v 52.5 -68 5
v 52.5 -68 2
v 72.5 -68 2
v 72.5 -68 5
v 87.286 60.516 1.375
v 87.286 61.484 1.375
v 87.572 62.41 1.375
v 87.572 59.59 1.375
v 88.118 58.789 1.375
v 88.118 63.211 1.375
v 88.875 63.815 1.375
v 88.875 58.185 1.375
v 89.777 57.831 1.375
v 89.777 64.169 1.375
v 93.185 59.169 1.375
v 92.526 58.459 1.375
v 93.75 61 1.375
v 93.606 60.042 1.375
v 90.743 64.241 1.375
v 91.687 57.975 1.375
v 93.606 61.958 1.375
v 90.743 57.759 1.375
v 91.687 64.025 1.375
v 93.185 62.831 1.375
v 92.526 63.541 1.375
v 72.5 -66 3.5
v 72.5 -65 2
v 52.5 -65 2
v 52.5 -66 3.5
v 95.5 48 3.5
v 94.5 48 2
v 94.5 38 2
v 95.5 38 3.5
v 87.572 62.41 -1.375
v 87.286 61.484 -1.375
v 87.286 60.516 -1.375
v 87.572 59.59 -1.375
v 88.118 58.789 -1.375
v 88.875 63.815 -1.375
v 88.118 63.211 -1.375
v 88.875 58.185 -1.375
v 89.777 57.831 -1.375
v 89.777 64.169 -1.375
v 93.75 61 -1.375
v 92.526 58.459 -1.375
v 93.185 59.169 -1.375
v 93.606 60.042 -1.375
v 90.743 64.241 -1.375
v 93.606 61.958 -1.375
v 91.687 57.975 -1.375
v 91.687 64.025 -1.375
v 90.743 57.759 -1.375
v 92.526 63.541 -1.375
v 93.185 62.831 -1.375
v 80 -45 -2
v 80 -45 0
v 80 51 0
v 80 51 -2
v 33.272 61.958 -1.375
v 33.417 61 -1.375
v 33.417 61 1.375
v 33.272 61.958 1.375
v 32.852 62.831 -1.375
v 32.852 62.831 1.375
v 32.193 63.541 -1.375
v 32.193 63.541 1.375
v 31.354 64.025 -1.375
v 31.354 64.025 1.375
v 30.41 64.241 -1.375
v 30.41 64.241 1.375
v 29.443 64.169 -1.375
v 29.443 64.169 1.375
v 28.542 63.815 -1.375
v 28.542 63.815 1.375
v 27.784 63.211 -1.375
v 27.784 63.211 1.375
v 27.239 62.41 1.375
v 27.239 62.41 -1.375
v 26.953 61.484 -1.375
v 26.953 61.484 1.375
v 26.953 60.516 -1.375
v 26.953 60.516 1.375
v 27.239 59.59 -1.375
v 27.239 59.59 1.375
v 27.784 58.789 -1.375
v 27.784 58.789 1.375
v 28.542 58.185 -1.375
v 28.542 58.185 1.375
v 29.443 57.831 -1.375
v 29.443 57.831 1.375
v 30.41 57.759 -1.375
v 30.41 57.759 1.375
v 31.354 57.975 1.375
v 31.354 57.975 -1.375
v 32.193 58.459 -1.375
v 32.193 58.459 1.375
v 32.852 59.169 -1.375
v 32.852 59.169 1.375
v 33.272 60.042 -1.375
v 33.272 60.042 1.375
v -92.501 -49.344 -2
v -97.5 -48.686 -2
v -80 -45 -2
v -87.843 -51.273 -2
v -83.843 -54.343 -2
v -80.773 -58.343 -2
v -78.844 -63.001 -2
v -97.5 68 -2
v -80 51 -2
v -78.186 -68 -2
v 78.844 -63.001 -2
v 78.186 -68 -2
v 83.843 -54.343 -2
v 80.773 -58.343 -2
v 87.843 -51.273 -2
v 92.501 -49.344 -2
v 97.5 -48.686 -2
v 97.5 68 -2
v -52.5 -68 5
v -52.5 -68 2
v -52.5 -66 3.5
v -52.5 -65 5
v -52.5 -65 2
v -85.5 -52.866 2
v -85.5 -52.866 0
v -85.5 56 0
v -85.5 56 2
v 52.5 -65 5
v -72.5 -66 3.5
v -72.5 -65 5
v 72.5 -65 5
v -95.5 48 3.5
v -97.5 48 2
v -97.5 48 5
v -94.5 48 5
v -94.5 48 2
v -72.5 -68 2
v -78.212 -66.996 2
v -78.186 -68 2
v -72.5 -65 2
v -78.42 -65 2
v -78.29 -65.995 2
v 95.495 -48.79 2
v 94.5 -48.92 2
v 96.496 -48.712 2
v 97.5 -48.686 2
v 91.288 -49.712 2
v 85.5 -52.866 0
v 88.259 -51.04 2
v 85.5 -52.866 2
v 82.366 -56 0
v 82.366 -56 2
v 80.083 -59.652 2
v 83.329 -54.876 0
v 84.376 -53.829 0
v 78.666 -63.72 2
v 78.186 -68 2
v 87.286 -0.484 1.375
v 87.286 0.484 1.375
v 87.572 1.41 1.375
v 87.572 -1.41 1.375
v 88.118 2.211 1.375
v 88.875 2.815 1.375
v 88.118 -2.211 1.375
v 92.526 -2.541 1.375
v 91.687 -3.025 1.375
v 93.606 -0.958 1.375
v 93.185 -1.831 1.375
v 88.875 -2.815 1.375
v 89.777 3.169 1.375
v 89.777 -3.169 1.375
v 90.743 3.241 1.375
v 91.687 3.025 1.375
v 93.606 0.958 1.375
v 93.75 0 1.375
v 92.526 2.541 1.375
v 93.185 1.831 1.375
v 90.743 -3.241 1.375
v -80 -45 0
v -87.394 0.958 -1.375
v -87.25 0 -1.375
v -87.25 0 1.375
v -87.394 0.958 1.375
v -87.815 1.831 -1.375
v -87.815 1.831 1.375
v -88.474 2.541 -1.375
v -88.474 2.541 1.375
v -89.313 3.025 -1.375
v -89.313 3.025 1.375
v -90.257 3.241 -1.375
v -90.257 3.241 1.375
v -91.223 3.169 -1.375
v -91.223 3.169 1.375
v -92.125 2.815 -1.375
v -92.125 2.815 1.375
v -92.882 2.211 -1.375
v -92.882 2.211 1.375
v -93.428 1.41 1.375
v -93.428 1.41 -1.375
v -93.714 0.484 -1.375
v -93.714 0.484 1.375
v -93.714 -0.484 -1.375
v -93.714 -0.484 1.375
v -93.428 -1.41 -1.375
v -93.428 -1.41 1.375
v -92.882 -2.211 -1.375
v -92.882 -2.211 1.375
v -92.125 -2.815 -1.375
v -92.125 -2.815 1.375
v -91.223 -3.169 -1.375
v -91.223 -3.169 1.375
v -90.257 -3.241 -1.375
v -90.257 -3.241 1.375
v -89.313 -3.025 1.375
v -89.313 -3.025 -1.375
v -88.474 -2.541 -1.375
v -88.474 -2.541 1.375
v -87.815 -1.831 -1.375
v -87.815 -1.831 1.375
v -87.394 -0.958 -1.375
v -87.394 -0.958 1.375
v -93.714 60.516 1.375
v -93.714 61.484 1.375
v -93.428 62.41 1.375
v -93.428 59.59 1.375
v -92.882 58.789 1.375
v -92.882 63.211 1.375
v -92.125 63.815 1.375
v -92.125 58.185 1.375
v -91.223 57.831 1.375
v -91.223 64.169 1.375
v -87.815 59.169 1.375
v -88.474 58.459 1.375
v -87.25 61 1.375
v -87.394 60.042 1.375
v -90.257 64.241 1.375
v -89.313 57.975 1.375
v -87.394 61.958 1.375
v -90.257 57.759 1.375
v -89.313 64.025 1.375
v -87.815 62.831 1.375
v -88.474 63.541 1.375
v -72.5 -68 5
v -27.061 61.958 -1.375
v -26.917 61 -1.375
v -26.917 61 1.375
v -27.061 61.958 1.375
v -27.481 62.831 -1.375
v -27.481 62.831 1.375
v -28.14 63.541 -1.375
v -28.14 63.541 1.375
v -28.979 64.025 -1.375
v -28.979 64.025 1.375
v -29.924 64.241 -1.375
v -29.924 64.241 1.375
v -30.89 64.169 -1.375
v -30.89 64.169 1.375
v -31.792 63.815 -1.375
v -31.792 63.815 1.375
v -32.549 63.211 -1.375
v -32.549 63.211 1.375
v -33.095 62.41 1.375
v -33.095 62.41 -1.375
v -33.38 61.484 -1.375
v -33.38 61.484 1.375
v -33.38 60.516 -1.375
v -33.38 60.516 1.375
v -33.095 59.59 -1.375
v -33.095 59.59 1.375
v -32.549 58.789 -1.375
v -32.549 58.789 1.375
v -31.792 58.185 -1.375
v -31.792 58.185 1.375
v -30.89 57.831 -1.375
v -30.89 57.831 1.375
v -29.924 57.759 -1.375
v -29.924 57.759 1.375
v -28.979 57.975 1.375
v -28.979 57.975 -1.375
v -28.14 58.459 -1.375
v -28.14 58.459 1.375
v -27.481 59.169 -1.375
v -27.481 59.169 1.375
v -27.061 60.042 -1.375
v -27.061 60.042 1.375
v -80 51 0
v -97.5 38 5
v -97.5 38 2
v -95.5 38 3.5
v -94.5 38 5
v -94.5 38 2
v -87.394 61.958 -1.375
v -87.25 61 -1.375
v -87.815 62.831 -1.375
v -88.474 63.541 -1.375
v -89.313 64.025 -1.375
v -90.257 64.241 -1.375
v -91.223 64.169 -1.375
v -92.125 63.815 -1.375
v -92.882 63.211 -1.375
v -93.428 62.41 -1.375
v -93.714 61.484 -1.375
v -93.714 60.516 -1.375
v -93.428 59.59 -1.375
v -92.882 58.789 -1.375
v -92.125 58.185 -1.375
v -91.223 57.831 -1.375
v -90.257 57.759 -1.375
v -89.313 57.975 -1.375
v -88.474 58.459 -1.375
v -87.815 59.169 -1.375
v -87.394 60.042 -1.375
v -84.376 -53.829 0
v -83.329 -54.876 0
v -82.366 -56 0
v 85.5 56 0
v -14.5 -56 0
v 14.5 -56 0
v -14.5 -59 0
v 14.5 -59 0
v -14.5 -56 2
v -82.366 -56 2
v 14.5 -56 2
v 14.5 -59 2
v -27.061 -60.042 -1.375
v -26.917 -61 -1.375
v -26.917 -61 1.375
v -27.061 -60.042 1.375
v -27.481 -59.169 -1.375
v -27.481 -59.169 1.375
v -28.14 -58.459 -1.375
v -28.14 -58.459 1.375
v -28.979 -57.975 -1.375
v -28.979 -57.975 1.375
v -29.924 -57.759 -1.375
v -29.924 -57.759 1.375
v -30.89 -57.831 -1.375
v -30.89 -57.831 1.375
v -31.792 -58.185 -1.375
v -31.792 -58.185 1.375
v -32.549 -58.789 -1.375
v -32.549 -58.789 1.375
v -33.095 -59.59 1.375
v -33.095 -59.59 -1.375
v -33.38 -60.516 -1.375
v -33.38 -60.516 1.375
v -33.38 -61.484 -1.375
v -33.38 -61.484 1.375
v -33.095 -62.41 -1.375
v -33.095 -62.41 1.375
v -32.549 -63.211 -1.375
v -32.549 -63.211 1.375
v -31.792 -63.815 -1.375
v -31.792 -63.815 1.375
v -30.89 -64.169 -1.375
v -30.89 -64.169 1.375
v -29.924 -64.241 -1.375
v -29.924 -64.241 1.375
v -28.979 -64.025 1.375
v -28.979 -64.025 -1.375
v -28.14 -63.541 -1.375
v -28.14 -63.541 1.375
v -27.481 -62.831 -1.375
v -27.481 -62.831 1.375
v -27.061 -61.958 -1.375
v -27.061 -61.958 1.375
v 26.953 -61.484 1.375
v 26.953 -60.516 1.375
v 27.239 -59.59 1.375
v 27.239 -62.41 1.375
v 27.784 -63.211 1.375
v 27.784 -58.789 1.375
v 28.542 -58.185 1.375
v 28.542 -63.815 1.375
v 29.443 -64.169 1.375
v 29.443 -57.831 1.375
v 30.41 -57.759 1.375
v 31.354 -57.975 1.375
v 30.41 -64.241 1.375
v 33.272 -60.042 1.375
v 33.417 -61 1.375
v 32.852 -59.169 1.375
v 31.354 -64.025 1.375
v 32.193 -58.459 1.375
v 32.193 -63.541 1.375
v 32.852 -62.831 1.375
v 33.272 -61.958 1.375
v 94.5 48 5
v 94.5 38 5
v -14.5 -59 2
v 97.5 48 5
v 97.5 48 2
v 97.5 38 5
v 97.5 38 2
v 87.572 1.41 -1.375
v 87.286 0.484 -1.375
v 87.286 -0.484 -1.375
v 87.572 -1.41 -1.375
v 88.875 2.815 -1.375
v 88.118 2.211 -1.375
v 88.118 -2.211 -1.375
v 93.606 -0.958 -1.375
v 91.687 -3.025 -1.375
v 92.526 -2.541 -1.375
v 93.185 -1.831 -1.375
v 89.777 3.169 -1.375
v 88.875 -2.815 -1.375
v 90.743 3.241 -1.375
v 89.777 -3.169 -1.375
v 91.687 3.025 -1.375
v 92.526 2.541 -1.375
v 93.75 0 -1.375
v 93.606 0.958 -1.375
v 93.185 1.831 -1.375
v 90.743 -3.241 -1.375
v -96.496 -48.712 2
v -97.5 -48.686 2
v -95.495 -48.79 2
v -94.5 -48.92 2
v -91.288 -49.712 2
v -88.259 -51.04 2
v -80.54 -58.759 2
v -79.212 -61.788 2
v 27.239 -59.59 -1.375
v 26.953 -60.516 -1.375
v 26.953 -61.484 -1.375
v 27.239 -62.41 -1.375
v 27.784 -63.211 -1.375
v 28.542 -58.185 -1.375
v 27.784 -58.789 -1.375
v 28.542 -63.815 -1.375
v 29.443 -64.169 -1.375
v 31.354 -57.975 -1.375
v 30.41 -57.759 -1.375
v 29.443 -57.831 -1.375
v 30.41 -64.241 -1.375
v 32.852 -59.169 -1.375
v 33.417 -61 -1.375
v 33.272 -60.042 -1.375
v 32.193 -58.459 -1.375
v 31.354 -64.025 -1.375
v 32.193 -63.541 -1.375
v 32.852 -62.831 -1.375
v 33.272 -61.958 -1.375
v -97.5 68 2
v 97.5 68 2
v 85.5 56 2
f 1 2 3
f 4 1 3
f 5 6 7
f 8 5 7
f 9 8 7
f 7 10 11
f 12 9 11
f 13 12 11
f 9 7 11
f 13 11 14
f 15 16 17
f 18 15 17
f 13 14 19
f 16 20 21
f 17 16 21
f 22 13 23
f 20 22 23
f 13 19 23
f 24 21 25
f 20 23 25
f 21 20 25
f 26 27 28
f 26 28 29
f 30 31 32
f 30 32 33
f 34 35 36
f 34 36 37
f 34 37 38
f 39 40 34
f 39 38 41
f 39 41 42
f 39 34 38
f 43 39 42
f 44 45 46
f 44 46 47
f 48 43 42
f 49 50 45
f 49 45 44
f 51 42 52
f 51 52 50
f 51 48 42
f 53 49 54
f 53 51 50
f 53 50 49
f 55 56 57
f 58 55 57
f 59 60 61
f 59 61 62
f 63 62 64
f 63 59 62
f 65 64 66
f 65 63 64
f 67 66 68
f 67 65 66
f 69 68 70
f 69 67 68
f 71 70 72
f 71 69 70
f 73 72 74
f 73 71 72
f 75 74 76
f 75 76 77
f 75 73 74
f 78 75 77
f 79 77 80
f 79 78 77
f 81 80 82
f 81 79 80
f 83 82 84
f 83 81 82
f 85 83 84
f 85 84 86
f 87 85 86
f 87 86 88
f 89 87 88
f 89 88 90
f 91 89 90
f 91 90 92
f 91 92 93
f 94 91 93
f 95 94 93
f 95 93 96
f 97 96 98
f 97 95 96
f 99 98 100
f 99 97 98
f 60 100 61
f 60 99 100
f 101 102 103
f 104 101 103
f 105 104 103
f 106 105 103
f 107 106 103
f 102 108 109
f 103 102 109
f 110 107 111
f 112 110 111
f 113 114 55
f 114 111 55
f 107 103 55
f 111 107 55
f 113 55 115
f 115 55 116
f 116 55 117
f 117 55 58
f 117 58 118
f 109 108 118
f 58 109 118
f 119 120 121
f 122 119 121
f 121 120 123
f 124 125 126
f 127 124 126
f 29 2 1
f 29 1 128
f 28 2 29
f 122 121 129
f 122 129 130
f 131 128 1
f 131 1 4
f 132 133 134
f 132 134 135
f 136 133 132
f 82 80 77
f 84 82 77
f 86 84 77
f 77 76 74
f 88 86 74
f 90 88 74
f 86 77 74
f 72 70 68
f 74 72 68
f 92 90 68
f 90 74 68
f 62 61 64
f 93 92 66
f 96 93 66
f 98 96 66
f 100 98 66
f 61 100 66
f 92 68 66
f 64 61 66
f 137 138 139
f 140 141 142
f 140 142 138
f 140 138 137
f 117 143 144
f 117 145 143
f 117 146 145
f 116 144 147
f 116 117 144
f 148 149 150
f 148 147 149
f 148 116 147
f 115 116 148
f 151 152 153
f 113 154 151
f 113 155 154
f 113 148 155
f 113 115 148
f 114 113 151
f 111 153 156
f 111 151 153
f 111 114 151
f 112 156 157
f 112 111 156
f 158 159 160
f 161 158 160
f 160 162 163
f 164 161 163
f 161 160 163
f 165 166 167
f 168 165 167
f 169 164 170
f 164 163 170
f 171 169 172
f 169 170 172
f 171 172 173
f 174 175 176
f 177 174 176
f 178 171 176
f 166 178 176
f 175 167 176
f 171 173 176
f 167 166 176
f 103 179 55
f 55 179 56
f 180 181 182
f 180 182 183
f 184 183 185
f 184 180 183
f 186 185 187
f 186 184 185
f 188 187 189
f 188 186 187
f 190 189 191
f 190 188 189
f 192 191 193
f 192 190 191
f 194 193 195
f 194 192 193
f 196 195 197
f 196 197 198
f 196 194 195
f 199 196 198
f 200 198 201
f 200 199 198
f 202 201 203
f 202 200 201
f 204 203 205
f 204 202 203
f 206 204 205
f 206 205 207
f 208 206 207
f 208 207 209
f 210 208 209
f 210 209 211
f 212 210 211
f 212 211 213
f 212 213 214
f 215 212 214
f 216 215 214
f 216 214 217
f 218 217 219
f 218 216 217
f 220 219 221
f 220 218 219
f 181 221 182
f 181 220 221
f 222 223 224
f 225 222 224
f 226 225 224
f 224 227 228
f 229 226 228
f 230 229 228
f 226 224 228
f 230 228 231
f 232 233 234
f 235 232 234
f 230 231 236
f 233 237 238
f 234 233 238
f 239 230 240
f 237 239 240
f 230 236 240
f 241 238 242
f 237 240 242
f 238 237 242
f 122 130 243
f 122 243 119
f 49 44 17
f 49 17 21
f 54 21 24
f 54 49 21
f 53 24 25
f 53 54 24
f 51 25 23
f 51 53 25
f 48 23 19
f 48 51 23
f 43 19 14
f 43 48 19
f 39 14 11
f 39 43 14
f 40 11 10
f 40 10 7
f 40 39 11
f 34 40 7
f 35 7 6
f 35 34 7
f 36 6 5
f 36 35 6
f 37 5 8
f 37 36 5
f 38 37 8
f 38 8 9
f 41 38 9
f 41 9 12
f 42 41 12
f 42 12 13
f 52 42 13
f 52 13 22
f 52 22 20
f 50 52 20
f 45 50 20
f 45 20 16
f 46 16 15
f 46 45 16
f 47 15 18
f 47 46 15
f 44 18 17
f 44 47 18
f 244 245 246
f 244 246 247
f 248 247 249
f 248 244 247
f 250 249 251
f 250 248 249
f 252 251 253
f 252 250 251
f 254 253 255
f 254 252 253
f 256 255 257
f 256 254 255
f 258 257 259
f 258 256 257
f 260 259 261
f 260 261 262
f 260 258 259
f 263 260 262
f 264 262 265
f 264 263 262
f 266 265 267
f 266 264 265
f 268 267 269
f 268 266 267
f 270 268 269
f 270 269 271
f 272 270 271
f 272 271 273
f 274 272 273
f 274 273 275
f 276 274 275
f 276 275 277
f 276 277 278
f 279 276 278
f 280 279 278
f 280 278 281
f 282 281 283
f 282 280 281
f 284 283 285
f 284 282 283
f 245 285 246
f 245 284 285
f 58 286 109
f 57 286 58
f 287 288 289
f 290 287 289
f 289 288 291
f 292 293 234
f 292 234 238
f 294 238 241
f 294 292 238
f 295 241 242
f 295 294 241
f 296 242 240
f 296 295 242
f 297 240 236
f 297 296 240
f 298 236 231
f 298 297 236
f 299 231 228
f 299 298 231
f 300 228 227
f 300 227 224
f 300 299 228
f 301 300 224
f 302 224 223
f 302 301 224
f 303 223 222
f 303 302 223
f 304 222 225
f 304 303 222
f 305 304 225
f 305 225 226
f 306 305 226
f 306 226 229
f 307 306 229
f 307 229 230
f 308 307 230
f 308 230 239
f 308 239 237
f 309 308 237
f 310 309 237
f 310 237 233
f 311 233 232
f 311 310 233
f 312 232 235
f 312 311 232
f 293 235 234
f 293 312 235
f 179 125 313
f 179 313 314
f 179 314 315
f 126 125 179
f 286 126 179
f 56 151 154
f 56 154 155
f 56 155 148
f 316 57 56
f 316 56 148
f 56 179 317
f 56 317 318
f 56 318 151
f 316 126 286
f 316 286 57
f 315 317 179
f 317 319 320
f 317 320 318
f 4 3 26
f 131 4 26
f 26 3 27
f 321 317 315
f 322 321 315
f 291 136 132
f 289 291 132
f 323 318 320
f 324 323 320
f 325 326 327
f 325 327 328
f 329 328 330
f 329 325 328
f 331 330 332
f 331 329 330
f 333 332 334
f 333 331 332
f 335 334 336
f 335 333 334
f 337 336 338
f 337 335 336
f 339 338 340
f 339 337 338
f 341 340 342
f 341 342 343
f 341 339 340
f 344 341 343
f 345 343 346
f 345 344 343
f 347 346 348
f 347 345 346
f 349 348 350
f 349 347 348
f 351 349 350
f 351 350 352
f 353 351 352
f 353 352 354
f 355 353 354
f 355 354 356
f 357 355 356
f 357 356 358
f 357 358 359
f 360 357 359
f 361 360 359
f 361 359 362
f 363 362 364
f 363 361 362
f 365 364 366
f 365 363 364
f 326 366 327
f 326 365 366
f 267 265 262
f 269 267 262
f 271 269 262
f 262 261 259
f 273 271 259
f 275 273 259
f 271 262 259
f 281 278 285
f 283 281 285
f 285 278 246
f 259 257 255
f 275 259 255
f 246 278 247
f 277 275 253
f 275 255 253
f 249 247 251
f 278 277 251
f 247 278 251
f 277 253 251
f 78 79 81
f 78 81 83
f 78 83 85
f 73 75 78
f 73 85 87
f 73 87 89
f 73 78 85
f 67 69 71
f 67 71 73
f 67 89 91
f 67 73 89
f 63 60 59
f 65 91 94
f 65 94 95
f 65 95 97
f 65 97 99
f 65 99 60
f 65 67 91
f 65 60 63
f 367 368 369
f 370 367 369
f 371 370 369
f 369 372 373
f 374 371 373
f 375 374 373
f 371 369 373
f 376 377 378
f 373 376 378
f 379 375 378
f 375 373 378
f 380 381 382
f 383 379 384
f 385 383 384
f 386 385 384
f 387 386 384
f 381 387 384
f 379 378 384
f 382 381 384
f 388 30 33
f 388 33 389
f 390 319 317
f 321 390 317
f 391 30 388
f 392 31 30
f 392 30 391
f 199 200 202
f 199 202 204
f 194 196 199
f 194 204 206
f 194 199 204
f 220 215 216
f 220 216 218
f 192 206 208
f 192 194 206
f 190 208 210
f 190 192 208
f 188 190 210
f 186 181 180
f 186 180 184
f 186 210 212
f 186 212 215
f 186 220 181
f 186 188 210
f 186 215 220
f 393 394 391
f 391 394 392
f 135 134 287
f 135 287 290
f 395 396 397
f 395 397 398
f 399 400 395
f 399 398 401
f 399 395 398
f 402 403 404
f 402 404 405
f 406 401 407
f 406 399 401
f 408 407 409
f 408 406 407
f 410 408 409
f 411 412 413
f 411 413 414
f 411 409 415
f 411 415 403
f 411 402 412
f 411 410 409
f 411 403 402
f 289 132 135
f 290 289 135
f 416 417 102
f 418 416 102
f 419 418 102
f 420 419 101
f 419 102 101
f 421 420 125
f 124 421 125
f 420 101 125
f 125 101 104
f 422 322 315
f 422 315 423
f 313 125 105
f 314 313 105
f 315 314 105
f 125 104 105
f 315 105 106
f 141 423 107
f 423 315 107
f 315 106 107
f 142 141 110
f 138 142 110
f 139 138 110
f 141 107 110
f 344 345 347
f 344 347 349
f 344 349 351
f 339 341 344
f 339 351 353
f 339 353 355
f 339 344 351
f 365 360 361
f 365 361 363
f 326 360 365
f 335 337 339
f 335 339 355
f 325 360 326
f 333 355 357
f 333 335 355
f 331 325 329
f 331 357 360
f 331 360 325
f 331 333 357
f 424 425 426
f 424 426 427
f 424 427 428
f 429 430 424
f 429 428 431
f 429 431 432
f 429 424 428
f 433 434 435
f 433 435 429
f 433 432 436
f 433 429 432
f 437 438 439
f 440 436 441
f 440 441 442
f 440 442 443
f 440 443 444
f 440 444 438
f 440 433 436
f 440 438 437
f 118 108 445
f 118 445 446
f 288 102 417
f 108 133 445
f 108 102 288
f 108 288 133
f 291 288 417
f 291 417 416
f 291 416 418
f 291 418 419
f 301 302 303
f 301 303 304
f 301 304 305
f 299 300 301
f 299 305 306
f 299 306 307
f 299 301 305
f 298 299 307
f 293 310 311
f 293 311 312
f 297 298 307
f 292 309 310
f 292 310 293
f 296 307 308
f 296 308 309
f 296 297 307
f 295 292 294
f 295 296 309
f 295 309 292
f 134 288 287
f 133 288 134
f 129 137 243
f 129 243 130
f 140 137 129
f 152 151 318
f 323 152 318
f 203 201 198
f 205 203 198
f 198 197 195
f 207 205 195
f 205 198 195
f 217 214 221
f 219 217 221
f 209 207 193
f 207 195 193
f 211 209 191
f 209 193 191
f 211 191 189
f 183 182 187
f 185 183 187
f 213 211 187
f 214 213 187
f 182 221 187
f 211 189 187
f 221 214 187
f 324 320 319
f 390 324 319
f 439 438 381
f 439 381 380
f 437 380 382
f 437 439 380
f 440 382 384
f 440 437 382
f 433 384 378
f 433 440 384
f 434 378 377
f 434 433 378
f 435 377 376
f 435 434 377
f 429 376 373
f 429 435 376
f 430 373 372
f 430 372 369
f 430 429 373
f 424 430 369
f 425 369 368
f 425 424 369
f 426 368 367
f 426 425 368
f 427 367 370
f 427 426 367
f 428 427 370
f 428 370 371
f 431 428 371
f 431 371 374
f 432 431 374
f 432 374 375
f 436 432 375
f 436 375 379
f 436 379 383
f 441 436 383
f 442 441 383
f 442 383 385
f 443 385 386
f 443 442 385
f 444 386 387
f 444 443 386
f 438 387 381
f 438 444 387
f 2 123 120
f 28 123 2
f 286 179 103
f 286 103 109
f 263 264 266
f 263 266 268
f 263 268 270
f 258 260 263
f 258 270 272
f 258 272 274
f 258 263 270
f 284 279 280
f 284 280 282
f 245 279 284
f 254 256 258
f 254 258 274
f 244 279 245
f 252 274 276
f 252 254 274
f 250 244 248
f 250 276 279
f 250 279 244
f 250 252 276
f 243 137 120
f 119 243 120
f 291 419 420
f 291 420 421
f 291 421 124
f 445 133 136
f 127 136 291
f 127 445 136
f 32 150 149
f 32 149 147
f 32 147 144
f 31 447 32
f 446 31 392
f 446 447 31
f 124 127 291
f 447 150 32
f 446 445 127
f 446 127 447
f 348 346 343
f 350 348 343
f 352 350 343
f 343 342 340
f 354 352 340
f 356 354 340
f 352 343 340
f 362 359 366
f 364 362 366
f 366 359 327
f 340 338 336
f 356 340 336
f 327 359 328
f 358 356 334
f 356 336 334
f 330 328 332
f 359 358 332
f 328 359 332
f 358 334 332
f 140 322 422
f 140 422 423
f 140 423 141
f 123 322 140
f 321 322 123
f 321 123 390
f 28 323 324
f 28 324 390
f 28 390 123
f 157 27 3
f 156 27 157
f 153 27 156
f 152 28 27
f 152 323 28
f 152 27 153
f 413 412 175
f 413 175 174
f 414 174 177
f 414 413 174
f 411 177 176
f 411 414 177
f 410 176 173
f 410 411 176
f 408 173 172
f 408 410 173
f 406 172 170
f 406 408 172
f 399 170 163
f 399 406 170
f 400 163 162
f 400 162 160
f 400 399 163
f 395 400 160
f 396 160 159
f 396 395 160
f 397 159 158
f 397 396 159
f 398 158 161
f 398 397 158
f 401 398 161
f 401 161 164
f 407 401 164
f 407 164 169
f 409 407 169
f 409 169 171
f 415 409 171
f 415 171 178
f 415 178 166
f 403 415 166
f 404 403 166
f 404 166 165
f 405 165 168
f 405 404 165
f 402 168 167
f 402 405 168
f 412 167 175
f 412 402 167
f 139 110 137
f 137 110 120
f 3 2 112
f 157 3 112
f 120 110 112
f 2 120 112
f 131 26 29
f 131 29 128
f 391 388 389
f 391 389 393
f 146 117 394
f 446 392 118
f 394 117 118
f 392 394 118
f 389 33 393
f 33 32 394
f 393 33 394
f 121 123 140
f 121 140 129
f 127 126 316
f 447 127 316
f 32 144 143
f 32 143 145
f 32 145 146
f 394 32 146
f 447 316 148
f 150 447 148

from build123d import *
from build123d.topology import SkipClean

# Parameters (mm, degrees)
SKETCH1_W               = 195
SKETCH1_H               = 136
SKETCH1_W_2             = 160
SKETCH1_H_2             = 96
BOSS_EXTRUDE1_DEPTH     = 2
SKETCH1_3_W             = 195
SKETCH1_3_H             = 136
BOSS_EXTRUDE2_DEPTH     = 2
CUT_EXTRUDE1_DEPTH      = 1.375
CUT_EXTRUDE1_DEPTH_BACK = 1.375
SKETCH2_R               = 3.25
SKETCH3_R               = 19.314272249
CUT_EXTRUDE2_DEPTH      = 119.938009064
SKETCH5_W               = 20
SKETCH5_H               = 3
SKETCH5_W_2             = 3
SKETCH5_H_2             = 10
BOSS_EXTRUDE3_DEPTH     = 3
CUT_EXTRUDE3_DEPTH      = 184.163861064
CUT_EXTRUDE4_DEPTH      = 152.615467549


with BuildPart() as part:
    # Sketch1 → Boss-Extrude1 (new body)
    with BuildSketch(Plane.XY):
        Rectangle(SKETCH1_W, SKETCH1_H)
        with Locations((0, 3)):
            Rectangle(SKETCH1_W_2, SKETCH1_H_2, mode=Mode.SUBTRACT)
    extrude(amount=-BOSS_EXTRUDE1_DEPTH)

    # Sketch1<3> → Boss-Extrude2 (add)
    with BuildSketch(Plane.XY):
        Rectangle(SKETCH1_3_W, SKETCH1_3_H)
        Polygon((85.5, 56), (85.5, -56), (14.5, -56), (14.5, -59), (-14.5, -59), (-14.5, -56), (-85.5, -56), (-85.5, 56), align=None, mode=Mode.SUBTRACT)
    extrude(amount=BOSS_EXTRUDE2_DEPTH)

    # Sketch2 → Cut-Extrude1 (cut, two sides: drawn at the far end of the back side and taken through both)
    with SkipClean():  # the faces are left unmerged after this step: merging them gives an invalid solid
        with BuildSketch(Plane.XY.offset(-CUT_EXTRUDE1_DEPTH_BACK)):
            with Locations((-90.5, 61)):
                Circle(SKETCH2_R)
            with Locations((90.5, 61)):
                Circle(SKETCH2_R)
            with Locations((90.5, -61)):
                Circle(SKETCH2_R)
            with Locations((-90.5, -61)):
                Circle(SKETCH2_R)
            with Locations((-30.166666667, -61)):
                Circle(SKETCH2_R)
            with Locations((30.166666667, -61)):
                Circle(SKETCH2_R)
            with Locations((90.5, 0)):
                Circle(SKETCH2_R)
            with Locations((-30.166666667, 61)):
                Circle(SKETCH2_R)
            with Locations((30.166666667, 61)):
                Circle(SKETCH2_R)
            with Locations((-90.5, 0)):
                Circle(SKETCH2_R)
        extrude(amount=CUT_EXTRUDE1_DEPTH + CUT_EXTRUDE1_DEPTH_BACK, mode=Mode.SUBTRACT)

    # Sketch3 → Cut-Extrude2 (cut, through all)
    with SkipClean():  # the faces are left unmerged after this step: merging them gives an invalid solid
        with BuildSketch(Plane(origin=(0, 0, -2), x_dir=(-1, 0, 0), z_dir=(0, 0, -1))):
            with Locations((97.5, -68)):
                Circle(SKETCH3_R)
        cut_extrude2 = extrude(amount=-CUT_EXTRUDE2_DEPTH, mode=Mode.SUBTRACT)

    # Mirror1: Cut-Extrude2 across plane
    with SkipClean():  # the faces are left unmerged after this step: merging them gives an invalid solid
        add(cut_extrude2.mirror(Plane(origin=(0, 0, 0), x_dir=(0, 0, 1), z_dir=(1, 0, 0))), mode=Mode.SUBTRACT)

    # Sketch5 → Boss-Extrude3 (add)
    with SkipClean():  # the faces are left unmerged after this step: merging them gives an invalid solid
        with BuildSketch(Plane.XY.offset(2)):
            with Locations((-62.5, -66.5)):
                Rectangle(SKETCH5_W, SKETCH5_H)
            with Locations((62.5, -66.5)):
                Rectangle(SKETCH5_W, SKETCH5_H)
            with Locations((-96, 43)):
                Rectangle(SKETCH5_W_2, SKETCH5_H_2)
            with Locations((96, 43)):
                Rectangle(SKETCH5_W_2, SKETCH5_H_2)
        extrude(amount=BOSS_EXTRUDE3_DEPTH)

    # Sketch6 → Cut-Extrude3 (cut, through all)
    with SkipClean():  # the faces are left unmerged after this step: merging them gives an invalid solid
        with BuildSketch(Plane(origin=(72.5, 0, 0), x_dir=(0, 0, -1), z_dir=(1, 0, 0))):
            Polygon((-3.5, -66), (-2, -65), (-5, -65), align=None)
        extrude(amount=-CUT_EXTRUDE3_DEPTH, mode=Mode.SUBTRACT)

    # Sketch7 → Cut-Extrude4 (cut, through all)
    with SkipClean():  # the faces are left unmerged after this step: merging them gives an invalid solid
        with BuildSketch(Plane(origin=(0, 48, 0), x_dir=(1, 0, 0), z_dir=(0, 1, 0))):
            Polygon((95.5, -3.5), (94.5, -2), (94.5, -5), align=None)
        cut_extrude4 = extrude(amount=-CUT_EXTRUDE4_DEPTH, mode=Mode.SUBTRACT)

    # Mirror2: Cut-Extrude4 across plane
    with SkipClean():  # the faces are left unmerged after this step: merging them gives an invalid solid
        add(cut_extrude4.mirror(Plane(origin=(0, 0, 0), x_dir=(0, 0, 1), z_dir=(1, 0, 0))), mode=Mode.SUBTRACT)


solid = part.part
